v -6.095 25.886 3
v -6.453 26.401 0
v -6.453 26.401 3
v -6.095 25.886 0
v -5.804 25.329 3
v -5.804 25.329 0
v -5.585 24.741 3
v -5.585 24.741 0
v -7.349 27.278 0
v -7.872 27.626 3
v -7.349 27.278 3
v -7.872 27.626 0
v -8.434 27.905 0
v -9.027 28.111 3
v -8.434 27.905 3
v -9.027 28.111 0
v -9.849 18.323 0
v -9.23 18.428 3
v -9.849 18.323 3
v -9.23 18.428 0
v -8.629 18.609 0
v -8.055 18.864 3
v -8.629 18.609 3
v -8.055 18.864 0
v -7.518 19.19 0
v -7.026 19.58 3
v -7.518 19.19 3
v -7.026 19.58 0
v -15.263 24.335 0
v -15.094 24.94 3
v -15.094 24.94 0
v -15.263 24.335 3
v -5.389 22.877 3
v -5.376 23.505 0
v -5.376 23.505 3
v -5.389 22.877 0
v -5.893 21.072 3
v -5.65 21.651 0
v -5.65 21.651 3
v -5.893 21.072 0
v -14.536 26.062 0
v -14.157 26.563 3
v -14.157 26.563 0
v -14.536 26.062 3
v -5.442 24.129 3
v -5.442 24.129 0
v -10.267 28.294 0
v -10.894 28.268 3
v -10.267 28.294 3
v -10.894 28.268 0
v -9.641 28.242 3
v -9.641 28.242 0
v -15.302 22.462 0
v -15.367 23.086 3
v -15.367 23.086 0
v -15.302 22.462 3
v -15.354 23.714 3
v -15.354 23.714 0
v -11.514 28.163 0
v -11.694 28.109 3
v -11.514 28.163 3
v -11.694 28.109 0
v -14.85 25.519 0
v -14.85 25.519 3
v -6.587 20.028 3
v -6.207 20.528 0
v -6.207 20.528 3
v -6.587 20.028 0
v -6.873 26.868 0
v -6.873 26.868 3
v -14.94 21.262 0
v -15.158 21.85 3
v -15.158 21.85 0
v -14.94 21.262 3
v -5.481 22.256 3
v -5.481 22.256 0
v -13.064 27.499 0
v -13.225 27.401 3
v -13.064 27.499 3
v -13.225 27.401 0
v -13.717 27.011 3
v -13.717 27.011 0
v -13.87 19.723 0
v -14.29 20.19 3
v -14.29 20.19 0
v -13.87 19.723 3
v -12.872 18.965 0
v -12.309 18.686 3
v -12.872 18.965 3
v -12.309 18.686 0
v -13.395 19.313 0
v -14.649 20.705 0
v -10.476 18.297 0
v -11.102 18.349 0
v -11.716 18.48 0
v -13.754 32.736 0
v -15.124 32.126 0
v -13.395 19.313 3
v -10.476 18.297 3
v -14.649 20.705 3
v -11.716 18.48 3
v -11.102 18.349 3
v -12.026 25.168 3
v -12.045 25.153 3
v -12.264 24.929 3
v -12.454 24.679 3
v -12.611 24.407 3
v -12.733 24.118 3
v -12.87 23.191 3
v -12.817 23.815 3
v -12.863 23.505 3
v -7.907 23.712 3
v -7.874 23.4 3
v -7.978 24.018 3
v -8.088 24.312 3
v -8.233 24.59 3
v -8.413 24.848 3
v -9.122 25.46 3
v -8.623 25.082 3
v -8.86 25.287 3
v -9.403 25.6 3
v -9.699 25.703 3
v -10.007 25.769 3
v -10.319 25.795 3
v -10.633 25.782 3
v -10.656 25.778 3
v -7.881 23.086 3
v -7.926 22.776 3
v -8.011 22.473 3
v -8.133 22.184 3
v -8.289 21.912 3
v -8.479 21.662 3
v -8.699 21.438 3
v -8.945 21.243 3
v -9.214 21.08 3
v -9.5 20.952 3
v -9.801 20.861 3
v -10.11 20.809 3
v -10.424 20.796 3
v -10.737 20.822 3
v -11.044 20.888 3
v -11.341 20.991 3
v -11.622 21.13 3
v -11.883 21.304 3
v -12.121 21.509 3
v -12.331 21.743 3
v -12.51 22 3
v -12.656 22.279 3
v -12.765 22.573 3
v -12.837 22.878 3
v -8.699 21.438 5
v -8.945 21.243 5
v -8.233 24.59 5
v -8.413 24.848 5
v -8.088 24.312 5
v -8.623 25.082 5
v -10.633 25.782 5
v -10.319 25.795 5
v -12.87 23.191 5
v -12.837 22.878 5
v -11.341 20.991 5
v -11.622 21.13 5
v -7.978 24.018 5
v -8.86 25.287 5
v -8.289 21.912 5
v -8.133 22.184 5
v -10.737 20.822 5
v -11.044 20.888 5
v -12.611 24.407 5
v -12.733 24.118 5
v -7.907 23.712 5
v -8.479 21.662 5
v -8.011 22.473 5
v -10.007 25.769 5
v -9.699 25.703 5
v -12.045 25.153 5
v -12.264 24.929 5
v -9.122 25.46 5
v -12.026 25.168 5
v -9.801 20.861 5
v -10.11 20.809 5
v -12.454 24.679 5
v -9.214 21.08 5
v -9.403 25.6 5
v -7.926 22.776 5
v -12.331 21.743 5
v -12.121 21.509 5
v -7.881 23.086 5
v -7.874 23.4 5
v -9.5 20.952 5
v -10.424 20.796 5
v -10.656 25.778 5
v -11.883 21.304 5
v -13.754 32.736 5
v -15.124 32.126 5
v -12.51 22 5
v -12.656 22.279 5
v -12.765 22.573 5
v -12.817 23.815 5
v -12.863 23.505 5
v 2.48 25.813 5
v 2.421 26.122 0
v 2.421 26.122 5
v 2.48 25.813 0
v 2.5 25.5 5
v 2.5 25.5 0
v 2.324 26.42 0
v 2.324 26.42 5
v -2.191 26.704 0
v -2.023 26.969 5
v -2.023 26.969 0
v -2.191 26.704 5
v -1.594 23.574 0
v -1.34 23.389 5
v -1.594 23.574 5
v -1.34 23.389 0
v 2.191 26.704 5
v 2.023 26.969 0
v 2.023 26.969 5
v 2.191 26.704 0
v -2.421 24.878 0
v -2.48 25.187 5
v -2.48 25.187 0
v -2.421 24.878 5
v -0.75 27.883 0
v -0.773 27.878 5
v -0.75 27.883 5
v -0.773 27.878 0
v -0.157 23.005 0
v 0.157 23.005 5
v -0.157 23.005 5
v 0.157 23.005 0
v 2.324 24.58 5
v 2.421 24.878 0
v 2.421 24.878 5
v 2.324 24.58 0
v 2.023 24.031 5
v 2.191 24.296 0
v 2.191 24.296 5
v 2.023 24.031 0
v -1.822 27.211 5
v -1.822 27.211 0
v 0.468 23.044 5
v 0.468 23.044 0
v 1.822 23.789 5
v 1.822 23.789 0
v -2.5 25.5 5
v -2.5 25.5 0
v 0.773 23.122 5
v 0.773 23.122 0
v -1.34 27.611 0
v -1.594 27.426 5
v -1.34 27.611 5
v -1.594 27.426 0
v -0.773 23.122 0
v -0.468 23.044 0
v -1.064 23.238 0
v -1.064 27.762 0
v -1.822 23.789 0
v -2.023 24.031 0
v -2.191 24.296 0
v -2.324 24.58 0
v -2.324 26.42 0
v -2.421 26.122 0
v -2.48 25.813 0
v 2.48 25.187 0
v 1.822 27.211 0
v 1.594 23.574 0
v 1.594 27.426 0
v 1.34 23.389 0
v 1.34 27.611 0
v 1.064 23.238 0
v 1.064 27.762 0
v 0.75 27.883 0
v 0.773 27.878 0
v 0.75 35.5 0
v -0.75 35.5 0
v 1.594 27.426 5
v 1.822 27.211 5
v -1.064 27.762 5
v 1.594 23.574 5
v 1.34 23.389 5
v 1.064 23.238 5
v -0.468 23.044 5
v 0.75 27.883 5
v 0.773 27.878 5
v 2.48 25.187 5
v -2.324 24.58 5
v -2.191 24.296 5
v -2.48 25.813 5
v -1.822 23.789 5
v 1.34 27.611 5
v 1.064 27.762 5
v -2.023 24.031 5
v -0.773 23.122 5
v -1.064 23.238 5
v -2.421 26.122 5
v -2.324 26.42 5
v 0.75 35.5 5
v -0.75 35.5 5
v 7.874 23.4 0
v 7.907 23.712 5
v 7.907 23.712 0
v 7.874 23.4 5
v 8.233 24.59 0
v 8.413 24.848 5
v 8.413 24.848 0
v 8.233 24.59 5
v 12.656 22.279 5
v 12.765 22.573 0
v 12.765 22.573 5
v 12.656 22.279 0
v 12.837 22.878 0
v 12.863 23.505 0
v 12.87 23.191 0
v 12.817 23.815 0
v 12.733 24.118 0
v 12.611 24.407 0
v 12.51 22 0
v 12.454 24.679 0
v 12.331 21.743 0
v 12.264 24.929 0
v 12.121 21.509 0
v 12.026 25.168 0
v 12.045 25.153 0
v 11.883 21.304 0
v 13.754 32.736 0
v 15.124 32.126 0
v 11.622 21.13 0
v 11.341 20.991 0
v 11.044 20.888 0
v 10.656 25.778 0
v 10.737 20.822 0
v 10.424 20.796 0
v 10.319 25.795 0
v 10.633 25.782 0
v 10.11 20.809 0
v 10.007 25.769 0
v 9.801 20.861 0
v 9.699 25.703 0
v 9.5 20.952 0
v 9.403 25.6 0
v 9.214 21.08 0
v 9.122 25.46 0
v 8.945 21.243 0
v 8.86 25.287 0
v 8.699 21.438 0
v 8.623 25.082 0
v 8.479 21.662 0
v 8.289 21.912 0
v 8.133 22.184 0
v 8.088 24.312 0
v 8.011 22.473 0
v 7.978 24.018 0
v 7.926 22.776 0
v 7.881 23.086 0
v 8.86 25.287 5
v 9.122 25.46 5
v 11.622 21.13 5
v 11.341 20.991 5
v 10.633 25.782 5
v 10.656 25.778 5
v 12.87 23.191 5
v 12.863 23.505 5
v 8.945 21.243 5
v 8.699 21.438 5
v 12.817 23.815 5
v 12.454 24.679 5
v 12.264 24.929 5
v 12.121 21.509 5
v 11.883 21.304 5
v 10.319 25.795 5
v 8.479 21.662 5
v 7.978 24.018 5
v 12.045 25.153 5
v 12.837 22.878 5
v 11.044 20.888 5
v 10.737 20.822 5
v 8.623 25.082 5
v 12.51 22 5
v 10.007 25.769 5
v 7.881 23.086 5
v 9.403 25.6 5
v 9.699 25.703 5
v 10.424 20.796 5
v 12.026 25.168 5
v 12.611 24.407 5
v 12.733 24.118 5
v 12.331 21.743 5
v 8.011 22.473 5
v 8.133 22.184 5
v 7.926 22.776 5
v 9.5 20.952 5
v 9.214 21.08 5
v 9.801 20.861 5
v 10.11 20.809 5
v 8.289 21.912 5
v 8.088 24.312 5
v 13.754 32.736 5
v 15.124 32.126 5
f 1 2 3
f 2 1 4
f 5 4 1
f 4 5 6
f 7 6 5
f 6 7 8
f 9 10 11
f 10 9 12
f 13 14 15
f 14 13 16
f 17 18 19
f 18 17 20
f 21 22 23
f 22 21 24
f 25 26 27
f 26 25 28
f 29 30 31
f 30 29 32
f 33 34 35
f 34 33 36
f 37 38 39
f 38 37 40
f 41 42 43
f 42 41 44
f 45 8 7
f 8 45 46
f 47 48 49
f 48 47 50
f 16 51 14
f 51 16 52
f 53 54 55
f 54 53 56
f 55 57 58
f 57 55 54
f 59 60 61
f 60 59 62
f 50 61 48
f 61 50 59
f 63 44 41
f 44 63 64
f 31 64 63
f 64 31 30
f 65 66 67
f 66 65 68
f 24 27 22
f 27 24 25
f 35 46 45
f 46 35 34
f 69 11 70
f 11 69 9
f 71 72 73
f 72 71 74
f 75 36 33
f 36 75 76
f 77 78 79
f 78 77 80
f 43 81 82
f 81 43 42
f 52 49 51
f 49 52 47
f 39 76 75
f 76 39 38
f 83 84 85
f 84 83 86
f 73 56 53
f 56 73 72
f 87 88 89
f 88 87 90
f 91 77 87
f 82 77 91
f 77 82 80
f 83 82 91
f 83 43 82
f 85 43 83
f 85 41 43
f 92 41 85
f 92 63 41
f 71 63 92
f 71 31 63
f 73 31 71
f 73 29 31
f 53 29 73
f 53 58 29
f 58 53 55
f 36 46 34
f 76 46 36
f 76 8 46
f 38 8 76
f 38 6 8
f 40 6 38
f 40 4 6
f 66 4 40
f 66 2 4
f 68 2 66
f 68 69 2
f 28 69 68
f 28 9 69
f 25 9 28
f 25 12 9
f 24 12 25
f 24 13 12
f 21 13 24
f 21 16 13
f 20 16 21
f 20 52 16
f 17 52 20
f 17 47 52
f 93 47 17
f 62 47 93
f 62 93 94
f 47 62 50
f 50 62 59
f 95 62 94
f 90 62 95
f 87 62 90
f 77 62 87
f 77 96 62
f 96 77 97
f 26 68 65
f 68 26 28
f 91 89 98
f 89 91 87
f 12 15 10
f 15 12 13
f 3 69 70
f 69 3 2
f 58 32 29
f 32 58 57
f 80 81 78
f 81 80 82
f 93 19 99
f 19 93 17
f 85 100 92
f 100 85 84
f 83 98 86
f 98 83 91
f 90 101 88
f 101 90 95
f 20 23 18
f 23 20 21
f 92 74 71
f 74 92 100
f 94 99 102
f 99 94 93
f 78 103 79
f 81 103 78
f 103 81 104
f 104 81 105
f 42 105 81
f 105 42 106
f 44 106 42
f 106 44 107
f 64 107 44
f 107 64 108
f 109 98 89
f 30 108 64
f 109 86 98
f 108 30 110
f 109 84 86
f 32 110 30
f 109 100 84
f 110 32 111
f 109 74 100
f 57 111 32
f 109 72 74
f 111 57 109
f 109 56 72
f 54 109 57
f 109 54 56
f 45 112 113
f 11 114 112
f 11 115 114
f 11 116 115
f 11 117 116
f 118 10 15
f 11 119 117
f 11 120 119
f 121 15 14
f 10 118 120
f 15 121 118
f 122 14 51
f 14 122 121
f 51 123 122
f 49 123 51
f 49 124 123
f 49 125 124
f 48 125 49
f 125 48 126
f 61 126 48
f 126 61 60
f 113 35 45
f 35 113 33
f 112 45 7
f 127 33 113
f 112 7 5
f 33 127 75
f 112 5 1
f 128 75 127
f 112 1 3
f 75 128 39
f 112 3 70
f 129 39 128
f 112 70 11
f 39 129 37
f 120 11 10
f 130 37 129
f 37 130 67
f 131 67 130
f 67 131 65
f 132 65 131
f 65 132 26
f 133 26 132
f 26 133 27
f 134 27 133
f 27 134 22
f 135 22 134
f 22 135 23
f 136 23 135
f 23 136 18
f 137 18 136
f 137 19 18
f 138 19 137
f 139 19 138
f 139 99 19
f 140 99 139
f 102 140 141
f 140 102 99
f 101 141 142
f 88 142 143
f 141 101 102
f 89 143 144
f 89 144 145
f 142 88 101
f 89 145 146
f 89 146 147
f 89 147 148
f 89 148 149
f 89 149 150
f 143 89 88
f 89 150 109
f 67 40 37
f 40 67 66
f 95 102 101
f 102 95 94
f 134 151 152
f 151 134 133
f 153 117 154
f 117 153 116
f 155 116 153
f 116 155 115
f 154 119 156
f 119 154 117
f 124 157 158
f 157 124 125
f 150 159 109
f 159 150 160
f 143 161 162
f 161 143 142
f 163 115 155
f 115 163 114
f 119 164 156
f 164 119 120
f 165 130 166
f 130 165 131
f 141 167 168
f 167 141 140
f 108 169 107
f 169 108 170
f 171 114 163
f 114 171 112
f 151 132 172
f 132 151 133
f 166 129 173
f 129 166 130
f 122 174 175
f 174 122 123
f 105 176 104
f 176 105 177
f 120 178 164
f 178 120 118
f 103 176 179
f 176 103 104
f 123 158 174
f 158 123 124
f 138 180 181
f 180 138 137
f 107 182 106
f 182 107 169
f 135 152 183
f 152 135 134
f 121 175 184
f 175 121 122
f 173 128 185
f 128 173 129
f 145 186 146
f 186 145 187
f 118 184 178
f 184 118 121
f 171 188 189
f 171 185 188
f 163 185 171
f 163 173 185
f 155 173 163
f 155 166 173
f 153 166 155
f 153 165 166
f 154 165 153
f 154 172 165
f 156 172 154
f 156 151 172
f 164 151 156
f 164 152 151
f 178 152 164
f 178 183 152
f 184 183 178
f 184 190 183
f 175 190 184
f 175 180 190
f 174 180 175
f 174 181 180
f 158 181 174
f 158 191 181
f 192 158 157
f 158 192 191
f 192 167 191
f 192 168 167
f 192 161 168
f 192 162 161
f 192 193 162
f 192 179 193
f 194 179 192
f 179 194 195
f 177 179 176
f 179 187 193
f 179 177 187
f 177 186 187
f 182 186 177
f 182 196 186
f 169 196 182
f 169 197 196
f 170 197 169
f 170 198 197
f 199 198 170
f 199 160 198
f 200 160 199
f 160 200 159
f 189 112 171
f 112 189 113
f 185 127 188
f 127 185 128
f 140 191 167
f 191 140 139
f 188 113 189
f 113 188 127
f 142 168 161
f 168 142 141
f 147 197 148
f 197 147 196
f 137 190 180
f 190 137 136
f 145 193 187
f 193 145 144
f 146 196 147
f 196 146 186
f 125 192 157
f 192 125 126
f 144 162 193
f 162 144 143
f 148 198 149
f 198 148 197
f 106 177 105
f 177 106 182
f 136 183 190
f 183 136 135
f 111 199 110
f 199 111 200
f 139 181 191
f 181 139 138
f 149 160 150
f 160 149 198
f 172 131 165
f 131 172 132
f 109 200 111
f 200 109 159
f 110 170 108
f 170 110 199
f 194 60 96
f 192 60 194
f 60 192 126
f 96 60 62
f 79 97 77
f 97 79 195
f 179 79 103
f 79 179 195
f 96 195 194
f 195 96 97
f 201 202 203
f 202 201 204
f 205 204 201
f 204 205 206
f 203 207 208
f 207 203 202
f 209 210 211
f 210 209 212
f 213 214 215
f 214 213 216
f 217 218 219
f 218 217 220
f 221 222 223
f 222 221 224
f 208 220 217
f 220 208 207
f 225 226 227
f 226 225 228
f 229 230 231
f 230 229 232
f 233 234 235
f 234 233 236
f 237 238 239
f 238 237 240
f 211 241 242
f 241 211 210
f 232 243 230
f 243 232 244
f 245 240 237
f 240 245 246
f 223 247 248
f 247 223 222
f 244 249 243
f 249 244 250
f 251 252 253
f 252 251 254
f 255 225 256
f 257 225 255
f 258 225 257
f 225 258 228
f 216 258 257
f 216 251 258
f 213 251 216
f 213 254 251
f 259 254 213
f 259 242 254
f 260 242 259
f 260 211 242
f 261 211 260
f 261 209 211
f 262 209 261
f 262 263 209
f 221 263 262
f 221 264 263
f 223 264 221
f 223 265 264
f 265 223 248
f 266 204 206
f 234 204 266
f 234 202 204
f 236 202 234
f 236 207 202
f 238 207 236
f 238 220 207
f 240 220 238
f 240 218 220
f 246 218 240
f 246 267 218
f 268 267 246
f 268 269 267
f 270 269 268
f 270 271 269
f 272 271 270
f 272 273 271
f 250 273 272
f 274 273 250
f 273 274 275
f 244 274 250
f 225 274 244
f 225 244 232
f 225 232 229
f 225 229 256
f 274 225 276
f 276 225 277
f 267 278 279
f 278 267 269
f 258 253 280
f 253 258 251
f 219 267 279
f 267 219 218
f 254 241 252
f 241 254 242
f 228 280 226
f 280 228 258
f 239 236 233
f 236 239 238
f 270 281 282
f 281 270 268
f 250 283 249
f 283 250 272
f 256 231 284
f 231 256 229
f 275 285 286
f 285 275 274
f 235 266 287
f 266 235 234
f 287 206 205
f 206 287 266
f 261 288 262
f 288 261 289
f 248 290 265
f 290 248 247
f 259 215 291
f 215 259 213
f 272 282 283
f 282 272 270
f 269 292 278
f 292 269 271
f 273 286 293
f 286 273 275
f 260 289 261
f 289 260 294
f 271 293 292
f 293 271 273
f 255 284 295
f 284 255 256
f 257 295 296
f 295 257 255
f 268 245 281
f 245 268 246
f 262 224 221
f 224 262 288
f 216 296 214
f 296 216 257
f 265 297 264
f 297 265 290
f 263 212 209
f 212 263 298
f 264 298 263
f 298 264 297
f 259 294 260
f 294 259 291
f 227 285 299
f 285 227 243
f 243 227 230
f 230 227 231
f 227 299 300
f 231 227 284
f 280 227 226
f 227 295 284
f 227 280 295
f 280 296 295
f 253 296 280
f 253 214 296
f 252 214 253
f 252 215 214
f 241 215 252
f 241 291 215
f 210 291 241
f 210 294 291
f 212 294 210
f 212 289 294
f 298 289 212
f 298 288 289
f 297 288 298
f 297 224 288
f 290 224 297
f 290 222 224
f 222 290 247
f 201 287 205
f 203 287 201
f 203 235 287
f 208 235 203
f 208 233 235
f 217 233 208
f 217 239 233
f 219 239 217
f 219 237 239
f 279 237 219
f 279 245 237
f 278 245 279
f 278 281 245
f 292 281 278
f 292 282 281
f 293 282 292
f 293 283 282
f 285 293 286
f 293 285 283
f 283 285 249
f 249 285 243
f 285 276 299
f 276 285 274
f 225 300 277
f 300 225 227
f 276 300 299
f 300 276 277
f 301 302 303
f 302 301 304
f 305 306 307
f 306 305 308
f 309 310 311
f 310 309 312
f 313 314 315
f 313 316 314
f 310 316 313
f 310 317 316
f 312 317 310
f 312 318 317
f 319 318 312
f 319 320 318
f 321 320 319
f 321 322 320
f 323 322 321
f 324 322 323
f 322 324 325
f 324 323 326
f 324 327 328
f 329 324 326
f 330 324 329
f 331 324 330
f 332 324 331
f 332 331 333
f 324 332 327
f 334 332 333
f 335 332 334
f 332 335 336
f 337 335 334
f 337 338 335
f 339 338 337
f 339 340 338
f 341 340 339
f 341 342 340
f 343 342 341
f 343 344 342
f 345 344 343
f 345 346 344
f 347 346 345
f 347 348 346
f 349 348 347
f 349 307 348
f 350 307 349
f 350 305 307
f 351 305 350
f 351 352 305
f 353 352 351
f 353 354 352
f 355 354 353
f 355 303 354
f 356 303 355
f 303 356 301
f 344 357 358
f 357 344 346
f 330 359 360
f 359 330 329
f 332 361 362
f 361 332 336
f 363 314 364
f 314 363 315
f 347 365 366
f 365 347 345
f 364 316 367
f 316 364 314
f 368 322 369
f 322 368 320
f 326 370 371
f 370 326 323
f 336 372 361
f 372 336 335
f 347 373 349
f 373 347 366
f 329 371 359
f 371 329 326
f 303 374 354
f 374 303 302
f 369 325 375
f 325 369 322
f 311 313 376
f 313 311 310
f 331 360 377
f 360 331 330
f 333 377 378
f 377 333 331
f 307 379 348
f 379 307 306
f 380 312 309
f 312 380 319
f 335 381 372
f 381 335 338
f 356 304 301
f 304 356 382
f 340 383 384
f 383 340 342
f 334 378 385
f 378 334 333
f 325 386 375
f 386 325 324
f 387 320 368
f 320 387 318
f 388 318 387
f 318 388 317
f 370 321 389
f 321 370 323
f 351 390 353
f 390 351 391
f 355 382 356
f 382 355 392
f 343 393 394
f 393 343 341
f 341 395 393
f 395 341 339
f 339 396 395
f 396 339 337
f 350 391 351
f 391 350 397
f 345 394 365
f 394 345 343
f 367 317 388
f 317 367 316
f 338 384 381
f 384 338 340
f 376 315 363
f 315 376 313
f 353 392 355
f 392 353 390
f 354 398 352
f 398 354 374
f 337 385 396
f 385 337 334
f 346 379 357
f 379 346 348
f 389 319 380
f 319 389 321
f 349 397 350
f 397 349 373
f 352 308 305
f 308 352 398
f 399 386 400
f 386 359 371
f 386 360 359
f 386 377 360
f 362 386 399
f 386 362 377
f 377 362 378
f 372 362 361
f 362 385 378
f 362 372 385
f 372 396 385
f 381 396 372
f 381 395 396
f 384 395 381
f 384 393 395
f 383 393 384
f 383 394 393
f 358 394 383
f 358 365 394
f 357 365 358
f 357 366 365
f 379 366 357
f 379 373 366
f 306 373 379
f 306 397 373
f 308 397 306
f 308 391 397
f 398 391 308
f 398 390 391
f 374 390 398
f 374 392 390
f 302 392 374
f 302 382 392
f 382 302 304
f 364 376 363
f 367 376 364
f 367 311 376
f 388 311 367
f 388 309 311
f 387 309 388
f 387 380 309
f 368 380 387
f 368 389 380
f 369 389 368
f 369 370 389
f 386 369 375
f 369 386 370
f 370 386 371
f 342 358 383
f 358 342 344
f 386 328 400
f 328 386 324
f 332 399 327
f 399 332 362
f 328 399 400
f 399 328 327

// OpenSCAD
//tube diameters
D1=41; // original


//small hole diameters
d1=5; // hose
d2=6; 
d3=10; //existing clamp
$fn=50;


module shape_1(d_inner, d_outer, z){
    
    //D2 = D1 + 2* d3 + 4; //outer tube (for topmost bound)
    //Z = 15;
    SIDE_OFFS = 3;
    
    difference() {
        //color("red")
        cylinder(d=d_outer, h=z);

        union() {
            //tube diameter
            color("blue")
            cylinder(d=d_inner, h=z);
            
            //bottom bound 
            translate([-(d_outer/2), -(d_outer/2),0])
            cube([d_outer, d_outer/2, z]);

            //left bound
            translate([-(d_inner/2)-20 + SIDE_OFFS,0,0])
                cube([20, d_outer, z]);

            //right bound
            translate([d_inner/2 - SIDE_OFFS,0,0])
                cube([20, d_outer, z]);
            
        }
    }
}

module cutout(z){
    zz = 3; // todo: 10
    CUTOUT = 1.5;
    
    //left
    rotate([0,0,24])
    translate([0,(D1+d3)/2,0]) {
        cylinder(d=d3, h=zz);
        cylinder(d=d1, h=z);
    }
    
    rotate([0,0,24])
    translate([-CUTOUT/2,(D1+d3)/2,0]) 
    cube([CUTOUT,d3,z]);

    
    //middle
    translate([0,(D1+d3)/2,0])
    cylinder(d=d1, h=z);
        
    translate([-CUTOUT/2,(D1+d3)/2,0]) 
    cube([CUTOUT,d3,z]);
    
    //right

    rotate([0,0,-24])
    translate([0,(D1+d3)/2,0]) 
    cylinder(d=d1, h=z);

    rotate([0,0,-24])
    translate([-CUTOUT/2,(D1+d3)/2,0]) 
    cube([CUTOUT,d3,z]);

}

module clamp() {
    DX = D1 + 3;
    
}

Z = 5;

//difference(){
//    shape_1(D1, D1 + 2* d3 + 4, Z);
    cutout(Z);
//}

//translate([0,0,Z])
//shape_1(D1, D1 + 3, 5);

//color("red")
//cylinder(d=D1, h=15);
